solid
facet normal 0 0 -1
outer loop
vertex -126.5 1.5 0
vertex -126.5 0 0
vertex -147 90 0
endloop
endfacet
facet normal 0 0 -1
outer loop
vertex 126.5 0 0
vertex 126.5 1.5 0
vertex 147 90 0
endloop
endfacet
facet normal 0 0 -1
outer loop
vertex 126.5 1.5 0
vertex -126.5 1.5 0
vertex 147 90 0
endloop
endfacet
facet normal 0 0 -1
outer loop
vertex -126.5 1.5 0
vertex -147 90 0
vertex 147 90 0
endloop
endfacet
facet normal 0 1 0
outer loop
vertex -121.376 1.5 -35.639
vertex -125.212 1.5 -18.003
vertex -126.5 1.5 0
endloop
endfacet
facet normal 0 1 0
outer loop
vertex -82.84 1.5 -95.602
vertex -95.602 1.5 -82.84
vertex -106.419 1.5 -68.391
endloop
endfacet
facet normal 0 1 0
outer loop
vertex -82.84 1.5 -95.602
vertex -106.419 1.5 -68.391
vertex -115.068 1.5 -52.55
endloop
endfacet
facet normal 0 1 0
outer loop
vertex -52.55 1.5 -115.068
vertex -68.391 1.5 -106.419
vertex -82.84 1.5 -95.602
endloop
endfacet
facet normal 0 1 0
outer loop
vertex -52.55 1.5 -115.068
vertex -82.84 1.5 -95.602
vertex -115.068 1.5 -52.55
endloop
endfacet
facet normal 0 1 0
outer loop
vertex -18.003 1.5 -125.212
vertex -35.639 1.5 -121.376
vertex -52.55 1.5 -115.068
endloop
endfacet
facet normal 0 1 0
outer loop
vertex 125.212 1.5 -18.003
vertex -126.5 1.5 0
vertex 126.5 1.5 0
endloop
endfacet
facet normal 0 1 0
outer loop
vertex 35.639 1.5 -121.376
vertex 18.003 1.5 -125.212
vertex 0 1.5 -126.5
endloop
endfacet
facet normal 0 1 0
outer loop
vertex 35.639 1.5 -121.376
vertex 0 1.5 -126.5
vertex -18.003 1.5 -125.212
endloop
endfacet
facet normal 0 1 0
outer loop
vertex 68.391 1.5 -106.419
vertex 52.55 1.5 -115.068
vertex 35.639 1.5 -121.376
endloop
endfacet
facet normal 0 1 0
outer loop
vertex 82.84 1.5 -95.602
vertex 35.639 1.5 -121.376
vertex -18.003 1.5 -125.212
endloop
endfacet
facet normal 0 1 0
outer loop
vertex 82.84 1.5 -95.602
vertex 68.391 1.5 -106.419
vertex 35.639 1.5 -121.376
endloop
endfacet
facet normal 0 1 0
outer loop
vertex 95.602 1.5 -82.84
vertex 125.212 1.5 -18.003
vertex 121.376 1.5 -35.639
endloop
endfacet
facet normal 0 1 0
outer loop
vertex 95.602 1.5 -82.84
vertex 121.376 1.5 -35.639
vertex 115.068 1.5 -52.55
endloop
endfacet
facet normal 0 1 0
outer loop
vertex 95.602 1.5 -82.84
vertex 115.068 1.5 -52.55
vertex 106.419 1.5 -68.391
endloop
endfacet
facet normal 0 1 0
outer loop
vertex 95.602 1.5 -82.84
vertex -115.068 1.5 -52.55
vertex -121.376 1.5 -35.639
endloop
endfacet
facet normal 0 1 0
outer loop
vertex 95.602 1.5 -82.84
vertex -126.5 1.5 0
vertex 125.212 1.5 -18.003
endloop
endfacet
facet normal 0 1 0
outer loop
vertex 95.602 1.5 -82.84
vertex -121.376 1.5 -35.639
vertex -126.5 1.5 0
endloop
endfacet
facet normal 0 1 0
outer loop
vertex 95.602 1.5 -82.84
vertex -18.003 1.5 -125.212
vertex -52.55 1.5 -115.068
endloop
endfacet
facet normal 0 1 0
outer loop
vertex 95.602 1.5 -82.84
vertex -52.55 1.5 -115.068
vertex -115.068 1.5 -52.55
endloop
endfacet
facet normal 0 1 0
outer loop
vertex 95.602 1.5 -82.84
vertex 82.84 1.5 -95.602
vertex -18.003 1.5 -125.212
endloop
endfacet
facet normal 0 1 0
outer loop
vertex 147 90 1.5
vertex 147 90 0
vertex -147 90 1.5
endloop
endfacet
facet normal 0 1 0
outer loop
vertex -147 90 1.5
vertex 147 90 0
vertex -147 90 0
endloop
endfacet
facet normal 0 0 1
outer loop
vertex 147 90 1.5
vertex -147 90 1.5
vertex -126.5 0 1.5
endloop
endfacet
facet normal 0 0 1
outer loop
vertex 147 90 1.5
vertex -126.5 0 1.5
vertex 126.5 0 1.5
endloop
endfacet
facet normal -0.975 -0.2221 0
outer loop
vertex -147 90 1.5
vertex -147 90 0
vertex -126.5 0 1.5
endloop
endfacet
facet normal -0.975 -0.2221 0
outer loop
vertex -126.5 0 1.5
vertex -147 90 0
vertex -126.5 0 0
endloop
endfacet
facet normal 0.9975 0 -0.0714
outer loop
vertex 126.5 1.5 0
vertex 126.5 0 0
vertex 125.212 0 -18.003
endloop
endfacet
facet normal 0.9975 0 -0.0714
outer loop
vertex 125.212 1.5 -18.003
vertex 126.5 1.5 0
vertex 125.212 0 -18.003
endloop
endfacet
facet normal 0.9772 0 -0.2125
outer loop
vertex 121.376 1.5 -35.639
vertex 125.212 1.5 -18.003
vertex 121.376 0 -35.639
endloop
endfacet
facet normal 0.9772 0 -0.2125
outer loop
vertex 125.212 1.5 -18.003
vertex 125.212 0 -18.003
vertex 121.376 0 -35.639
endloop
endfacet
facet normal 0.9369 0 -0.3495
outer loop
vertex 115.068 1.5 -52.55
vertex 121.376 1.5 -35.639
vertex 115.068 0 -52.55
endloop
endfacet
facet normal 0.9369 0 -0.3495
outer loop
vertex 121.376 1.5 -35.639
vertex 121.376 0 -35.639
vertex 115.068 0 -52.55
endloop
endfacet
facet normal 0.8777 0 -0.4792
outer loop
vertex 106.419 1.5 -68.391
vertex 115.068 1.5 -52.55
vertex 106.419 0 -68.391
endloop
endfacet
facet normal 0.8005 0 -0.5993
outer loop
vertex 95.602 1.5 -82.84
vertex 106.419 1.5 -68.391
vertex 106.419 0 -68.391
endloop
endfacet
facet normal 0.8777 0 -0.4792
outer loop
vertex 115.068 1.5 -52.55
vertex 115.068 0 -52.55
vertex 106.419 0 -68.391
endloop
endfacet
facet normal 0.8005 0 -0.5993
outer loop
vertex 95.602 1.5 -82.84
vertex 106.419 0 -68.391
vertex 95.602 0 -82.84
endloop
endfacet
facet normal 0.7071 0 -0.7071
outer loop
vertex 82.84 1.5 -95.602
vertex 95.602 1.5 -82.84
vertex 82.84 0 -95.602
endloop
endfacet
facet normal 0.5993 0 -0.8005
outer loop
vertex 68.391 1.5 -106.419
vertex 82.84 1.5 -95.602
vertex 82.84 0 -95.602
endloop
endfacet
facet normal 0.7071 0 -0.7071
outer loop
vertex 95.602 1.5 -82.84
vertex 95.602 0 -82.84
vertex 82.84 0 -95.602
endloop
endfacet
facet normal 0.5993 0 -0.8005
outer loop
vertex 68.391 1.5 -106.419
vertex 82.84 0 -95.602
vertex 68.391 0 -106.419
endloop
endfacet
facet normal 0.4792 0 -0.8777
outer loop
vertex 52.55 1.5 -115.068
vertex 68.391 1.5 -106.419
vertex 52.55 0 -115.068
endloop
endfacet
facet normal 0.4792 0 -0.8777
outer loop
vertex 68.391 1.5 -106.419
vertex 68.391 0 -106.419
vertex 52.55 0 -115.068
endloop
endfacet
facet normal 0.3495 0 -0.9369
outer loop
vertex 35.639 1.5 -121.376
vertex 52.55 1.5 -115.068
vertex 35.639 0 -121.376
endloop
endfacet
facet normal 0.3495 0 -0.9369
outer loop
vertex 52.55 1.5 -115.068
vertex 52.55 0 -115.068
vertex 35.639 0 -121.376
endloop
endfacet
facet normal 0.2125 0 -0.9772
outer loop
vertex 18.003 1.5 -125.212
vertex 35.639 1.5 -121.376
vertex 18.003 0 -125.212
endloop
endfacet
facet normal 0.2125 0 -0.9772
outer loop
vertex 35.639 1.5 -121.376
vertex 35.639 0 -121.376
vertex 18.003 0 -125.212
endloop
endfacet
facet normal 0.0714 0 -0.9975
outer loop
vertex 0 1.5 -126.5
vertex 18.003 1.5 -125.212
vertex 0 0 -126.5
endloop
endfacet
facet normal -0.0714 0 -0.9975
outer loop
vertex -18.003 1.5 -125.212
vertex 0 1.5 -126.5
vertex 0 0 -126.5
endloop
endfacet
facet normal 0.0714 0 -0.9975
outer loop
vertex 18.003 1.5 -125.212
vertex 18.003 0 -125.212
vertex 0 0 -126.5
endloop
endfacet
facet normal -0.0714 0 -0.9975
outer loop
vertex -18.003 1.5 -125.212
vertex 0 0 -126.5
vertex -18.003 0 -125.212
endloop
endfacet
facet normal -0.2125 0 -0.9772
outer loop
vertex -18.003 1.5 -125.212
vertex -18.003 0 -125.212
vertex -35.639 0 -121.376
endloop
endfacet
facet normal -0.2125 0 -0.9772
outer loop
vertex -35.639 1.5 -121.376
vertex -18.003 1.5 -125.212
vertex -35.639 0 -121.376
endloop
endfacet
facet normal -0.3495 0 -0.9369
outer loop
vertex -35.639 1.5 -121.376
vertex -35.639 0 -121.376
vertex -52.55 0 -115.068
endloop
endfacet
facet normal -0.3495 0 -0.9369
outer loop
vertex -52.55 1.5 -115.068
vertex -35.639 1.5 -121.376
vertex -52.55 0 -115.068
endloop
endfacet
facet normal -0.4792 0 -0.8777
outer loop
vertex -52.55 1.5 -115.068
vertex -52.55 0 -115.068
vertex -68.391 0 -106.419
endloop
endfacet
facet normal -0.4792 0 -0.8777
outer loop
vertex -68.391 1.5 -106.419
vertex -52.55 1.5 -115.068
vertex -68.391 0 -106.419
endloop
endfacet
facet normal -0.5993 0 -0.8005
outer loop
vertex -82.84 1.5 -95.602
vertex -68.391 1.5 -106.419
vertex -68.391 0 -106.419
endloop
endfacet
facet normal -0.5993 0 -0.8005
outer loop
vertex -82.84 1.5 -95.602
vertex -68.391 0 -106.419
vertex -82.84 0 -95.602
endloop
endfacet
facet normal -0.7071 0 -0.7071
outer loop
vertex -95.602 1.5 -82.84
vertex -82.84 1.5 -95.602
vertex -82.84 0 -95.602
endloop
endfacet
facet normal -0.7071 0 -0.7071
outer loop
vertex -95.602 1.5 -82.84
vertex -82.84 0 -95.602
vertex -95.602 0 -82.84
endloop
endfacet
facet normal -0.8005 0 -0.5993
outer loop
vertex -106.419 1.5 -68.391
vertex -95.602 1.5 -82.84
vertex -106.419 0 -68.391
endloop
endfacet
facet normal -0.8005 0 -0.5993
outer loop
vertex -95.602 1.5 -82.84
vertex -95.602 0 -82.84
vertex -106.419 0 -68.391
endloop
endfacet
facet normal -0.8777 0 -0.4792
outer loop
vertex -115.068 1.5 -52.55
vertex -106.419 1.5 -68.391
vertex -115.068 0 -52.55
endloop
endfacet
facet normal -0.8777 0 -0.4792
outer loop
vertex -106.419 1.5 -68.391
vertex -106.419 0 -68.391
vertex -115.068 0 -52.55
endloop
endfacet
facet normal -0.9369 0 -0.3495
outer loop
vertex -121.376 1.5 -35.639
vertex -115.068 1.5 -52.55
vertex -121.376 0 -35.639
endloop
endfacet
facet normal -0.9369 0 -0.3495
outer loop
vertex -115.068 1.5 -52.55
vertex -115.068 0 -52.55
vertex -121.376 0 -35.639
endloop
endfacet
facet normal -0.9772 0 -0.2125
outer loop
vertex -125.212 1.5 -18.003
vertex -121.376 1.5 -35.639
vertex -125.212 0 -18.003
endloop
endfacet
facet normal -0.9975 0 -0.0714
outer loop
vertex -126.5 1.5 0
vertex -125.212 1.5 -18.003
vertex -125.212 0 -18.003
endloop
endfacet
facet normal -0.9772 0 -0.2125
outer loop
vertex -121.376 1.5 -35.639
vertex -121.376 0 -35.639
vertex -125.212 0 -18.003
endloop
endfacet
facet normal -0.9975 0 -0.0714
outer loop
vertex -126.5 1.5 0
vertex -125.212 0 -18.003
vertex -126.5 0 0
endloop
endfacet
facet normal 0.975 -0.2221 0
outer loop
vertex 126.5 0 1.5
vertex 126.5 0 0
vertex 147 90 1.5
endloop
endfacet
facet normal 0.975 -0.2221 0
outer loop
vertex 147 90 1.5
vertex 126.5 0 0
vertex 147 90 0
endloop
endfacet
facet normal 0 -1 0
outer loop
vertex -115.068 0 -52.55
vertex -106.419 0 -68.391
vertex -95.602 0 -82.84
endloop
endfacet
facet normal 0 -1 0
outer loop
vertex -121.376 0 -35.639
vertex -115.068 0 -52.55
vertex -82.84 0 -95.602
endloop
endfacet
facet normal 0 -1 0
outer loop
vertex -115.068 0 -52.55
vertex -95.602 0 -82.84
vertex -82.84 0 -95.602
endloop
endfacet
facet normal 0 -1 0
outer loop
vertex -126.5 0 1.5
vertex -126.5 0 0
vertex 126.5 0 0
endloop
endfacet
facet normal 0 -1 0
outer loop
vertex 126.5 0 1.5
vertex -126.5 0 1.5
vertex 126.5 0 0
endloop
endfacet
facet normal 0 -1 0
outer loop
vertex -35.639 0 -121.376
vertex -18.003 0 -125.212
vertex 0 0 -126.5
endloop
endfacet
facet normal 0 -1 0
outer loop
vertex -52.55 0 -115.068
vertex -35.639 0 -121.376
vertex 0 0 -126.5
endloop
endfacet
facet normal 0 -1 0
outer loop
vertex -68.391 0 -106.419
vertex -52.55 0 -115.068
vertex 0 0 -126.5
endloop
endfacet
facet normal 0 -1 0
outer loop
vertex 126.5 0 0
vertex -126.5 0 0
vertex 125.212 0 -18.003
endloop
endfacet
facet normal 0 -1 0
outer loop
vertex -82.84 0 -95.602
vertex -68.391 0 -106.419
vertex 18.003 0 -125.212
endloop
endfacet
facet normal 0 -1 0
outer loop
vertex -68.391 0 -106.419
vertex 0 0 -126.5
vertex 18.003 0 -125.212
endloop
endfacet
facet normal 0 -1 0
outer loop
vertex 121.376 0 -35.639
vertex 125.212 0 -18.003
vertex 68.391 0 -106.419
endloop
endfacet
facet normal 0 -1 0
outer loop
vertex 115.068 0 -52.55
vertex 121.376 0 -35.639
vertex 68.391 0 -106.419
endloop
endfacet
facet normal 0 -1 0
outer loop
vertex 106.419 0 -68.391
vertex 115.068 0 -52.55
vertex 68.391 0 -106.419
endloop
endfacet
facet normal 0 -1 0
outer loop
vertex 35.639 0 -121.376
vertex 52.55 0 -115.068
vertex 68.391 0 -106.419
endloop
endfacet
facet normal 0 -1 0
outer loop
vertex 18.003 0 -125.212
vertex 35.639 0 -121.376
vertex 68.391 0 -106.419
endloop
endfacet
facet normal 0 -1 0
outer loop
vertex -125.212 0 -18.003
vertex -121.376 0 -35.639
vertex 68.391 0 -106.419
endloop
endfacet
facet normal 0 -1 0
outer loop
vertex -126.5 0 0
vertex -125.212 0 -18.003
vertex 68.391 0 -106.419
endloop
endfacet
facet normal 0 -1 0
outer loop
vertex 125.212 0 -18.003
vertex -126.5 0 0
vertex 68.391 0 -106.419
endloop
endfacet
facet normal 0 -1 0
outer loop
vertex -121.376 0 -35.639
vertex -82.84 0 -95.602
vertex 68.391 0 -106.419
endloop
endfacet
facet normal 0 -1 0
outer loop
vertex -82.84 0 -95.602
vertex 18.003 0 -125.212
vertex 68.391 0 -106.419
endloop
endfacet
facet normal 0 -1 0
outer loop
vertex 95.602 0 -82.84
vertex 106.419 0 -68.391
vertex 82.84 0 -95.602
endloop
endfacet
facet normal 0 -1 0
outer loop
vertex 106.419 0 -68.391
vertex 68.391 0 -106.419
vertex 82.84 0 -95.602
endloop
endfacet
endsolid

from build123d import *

# Parameters (mm, degrees)
AUFSATZ_LINEAR_AUSTRAGEN2_DEPTH = 1.5
AUFSATZ_LINEAR_AUSTRAGEN3_DEPTH = 1.5


with BuildPart() as part:
    # Skizze1 → Aufsatz-Linear austragen2 (new body)
    with BuildSketch(Plane(origin=(0, 0, 0), x_dir=(1, 0, 0), z_dir=(0, 1, 0))):
        with BuildLine():
            Line((-126.5, 0), (126.5, 0))
            ThreePointArc((126.5, 0), (0, 126.5), (-126.5, 0))
        make_face()
    extrude(amount=AUFSATZ_LINEAR_AUSTRAGEN2_DEPTH)

    # Skizze2 → Aufsatz-Linear austragen3 (add)
    with BuildSketch(Plane.XY):
        Polygon((126.5, 0), (147, 90), (-147, 90), (-126.5, 0), align=None)
    extrude(amount=AUFSATZ_LINEAR_AUSTRAGEN3_DEPTH)


solid = part.part
